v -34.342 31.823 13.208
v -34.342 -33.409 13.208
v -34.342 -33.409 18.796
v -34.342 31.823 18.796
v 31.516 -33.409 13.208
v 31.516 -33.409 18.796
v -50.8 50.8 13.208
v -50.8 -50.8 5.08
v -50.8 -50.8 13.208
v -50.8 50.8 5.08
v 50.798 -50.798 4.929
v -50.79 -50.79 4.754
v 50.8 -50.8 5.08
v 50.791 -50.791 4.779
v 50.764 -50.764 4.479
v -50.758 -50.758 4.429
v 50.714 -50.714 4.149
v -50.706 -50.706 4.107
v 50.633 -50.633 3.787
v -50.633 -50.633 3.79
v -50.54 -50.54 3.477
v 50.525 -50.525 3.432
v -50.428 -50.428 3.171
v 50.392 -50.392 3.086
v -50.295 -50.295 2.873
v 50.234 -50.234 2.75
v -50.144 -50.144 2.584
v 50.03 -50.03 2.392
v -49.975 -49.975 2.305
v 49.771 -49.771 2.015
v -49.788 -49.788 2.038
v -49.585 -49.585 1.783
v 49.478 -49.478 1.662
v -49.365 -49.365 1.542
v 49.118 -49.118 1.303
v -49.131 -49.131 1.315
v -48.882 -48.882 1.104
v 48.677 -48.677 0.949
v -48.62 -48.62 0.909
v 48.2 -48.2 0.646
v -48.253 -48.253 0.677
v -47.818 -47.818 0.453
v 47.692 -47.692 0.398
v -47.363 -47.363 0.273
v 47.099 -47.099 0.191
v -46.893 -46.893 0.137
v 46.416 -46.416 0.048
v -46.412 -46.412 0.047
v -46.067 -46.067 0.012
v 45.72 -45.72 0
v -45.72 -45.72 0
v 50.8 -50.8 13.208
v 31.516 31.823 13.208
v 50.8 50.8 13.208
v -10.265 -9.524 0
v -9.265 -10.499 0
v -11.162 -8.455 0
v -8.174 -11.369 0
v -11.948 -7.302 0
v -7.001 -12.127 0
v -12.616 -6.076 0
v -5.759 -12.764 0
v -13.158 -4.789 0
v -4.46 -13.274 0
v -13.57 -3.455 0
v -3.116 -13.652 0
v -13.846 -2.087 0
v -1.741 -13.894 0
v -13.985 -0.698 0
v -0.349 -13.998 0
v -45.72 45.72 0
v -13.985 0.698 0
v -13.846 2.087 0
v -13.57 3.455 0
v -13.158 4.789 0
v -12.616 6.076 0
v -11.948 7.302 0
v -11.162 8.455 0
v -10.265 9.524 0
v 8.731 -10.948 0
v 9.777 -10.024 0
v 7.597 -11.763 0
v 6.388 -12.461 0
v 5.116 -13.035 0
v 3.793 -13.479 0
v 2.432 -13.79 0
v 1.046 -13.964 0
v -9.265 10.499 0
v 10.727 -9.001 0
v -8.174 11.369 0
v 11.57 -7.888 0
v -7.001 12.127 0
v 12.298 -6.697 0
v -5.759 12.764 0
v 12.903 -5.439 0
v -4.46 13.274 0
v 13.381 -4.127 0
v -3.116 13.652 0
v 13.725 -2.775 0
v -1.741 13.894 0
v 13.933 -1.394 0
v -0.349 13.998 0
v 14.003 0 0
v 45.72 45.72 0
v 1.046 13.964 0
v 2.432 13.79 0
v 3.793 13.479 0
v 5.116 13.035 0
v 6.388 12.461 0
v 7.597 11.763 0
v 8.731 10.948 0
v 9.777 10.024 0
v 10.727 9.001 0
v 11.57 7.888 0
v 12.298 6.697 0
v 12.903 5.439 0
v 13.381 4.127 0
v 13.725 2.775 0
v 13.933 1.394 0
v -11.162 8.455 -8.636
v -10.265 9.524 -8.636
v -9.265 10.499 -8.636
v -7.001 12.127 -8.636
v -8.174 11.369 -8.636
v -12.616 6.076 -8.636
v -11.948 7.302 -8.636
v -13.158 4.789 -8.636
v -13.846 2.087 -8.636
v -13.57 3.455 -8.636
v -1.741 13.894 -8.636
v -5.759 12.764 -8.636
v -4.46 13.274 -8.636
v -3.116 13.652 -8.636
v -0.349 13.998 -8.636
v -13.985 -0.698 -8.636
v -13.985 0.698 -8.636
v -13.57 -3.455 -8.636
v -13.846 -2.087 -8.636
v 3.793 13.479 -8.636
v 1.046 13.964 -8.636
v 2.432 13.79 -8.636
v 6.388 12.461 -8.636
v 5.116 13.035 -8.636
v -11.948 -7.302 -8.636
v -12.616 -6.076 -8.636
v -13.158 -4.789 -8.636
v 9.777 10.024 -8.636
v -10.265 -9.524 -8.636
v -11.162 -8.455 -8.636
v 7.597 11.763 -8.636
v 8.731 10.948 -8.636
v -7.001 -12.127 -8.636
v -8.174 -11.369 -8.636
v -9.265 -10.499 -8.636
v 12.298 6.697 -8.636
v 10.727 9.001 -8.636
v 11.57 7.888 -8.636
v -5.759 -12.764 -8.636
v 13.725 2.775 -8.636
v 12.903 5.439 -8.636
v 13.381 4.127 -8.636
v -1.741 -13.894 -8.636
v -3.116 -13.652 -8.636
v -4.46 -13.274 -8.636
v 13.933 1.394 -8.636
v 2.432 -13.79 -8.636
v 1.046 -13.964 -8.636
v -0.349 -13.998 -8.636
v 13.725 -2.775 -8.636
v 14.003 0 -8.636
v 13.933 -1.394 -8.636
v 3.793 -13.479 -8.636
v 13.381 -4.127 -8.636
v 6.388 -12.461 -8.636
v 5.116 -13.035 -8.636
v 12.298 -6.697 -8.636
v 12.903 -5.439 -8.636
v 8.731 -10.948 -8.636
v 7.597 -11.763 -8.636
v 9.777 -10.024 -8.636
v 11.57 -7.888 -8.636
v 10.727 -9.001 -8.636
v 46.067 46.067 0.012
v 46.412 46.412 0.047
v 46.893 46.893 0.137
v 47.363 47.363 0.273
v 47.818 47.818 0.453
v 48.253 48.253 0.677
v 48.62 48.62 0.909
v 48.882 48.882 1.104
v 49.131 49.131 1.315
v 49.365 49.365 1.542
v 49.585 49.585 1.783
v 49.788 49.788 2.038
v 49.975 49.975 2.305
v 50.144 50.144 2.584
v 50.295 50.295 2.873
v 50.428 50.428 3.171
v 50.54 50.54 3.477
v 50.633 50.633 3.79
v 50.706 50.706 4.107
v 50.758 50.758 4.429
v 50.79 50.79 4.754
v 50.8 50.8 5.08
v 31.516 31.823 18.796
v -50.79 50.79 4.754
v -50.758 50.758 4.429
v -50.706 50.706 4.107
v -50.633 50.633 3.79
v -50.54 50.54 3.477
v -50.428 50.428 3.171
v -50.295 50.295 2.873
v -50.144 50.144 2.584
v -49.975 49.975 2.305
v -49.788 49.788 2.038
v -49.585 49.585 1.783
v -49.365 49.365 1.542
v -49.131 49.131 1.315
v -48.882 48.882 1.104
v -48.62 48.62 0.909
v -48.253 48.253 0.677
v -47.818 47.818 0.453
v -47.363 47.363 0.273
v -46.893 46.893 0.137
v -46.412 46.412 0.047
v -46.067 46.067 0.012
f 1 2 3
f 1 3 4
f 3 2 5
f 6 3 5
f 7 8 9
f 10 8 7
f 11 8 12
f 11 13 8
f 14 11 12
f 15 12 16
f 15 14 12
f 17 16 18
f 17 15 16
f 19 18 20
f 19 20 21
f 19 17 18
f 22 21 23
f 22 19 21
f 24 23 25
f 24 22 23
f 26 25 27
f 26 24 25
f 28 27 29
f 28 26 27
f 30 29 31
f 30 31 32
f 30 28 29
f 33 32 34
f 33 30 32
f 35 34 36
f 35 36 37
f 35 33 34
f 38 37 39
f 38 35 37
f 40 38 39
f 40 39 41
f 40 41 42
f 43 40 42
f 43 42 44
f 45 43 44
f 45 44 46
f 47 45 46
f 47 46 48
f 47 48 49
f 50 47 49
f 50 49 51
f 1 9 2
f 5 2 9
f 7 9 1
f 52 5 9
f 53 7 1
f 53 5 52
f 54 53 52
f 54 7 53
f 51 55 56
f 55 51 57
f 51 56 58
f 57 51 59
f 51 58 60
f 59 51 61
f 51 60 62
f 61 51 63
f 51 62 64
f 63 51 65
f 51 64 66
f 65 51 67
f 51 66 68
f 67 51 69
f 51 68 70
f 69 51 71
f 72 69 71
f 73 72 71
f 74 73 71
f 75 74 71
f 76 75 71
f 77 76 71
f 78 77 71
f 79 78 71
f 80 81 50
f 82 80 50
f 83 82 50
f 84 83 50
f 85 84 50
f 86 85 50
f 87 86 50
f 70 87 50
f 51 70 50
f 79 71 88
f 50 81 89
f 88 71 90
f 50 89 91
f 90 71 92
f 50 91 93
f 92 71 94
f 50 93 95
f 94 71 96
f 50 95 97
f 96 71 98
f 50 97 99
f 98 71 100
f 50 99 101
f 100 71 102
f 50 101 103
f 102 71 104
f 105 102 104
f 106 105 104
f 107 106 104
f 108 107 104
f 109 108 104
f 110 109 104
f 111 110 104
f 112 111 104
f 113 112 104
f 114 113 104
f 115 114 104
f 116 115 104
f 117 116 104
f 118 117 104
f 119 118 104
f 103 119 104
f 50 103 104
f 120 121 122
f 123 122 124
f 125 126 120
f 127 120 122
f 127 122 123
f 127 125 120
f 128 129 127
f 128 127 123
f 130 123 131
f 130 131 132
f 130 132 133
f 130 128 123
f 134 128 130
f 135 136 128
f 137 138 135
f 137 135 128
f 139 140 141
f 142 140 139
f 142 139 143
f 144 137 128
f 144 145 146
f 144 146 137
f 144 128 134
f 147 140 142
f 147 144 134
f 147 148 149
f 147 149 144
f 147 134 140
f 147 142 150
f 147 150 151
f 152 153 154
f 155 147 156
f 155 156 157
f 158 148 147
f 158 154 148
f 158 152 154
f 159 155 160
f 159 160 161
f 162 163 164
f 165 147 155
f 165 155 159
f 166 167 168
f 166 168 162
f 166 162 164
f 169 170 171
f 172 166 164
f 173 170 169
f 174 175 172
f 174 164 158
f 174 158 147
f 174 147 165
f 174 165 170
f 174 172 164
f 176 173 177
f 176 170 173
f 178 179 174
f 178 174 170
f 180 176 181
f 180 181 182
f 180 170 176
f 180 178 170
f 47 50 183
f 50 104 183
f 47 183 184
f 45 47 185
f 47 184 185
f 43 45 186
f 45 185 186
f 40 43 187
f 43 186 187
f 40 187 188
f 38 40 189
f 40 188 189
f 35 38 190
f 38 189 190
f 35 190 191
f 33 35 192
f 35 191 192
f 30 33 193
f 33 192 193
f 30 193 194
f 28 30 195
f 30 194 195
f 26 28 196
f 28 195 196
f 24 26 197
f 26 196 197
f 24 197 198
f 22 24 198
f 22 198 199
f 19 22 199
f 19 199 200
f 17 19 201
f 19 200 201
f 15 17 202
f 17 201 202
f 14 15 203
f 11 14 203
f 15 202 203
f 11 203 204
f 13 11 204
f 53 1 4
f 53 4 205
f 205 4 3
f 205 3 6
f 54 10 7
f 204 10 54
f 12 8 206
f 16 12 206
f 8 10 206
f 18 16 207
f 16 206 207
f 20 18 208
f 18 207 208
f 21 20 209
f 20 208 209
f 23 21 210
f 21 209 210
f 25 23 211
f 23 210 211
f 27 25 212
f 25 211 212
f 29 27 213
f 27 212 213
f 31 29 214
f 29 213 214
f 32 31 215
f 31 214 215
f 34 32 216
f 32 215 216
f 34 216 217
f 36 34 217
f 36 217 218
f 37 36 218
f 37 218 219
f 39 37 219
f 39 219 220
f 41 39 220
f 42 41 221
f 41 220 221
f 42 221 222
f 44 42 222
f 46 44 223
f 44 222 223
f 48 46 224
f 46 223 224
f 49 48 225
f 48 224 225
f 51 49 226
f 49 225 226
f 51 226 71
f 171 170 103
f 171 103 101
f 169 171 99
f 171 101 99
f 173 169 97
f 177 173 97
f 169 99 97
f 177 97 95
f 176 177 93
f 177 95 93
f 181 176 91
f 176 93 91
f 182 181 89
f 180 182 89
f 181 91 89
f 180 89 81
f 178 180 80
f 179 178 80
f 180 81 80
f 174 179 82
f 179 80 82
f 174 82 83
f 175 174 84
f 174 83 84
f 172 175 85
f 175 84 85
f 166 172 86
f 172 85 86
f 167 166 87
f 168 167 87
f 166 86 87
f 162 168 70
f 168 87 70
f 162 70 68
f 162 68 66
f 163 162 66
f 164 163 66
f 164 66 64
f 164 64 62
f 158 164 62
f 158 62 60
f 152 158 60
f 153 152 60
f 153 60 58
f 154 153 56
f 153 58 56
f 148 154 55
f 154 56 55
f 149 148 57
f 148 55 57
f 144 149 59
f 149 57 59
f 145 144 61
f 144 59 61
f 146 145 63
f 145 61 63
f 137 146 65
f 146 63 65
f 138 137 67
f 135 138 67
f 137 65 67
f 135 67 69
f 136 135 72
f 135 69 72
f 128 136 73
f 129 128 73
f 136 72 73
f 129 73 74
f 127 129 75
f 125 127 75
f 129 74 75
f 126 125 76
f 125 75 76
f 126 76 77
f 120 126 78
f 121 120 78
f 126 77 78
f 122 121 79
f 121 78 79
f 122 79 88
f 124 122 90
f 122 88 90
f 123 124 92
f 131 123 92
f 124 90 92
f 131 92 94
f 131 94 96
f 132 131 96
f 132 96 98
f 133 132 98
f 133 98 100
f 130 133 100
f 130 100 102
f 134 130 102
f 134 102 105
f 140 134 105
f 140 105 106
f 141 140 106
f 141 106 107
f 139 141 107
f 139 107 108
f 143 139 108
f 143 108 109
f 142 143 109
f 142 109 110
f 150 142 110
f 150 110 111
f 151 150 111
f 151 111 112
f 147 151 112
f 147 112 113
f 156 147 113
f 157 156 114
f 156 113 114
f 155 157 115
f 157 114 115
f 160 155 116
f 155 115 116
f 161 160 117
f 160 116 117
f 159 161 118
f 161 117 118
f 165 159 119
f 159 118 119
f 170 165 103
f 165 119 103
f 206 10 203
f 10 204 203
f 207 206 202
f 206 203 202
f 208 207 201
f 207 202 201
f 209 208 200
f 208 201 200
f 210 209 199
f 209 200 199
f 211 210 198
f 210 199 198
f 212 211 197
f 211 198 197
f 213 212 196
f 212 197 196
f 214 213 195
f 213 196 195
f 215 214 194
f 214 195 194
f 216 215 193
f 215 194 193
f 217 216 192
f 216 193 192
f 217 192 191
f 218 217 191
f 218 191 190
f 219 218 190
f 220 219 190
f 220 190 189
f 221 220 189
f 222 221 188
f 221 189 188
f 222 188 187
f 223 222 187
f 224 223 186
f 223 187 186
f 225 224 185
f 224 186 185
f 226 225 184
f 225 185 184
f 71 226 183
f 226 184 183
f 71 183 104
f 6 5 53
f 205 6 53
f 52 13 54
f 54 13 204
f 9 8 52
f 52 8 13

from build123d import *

# Parameters (mm, degrees)
F0_W     = 101.6
F0_H     = 101.6
F1_DEPTH = 13.208
F2_R     = 14.002831
F3_DEPTH = 8.636
F5_W     = 65.857943
F5_H     = 65.231863
F6_DEPTH = 5.588
F7_R     = 5.08


with BuildPart() as f1:
    # F0 (on Top) → F1 (new body)
    with BuildSketch(Plane.XY):
        Rectangle(F0_W, F0_H)
    extrude(amount=F1_DEPTH)

    # F2 (on face) → F3 (join)
    with BuildSketch(Plane(origin=(0, 0, 0), x_dir=(1, 0, 0), z_dir=(0, 0, -1))):
        Circle(F2_R)
    extrude(amount=F3_DEPTH)

    # F5 (on face) → F6 (join)
    with BuildSketch(Plane.XY.offset(13.208)):
        with Locations((-1.412789, -0.793302)):
            Rectangle(F5_W, F5_H)
    extrude(amount=F6_DEPTH)

    # F7
    f7_edges = [f1.edges().sort_by_distance(p)[0] for p in [
        (-50.8, 0, 0),
        (0, 50.8, 0),
        (50.8, 0, 0),
        (0, -50.8, 0),
    ]]
    fillet(f7_edges, radius=F7_R)


solid = f1.part
